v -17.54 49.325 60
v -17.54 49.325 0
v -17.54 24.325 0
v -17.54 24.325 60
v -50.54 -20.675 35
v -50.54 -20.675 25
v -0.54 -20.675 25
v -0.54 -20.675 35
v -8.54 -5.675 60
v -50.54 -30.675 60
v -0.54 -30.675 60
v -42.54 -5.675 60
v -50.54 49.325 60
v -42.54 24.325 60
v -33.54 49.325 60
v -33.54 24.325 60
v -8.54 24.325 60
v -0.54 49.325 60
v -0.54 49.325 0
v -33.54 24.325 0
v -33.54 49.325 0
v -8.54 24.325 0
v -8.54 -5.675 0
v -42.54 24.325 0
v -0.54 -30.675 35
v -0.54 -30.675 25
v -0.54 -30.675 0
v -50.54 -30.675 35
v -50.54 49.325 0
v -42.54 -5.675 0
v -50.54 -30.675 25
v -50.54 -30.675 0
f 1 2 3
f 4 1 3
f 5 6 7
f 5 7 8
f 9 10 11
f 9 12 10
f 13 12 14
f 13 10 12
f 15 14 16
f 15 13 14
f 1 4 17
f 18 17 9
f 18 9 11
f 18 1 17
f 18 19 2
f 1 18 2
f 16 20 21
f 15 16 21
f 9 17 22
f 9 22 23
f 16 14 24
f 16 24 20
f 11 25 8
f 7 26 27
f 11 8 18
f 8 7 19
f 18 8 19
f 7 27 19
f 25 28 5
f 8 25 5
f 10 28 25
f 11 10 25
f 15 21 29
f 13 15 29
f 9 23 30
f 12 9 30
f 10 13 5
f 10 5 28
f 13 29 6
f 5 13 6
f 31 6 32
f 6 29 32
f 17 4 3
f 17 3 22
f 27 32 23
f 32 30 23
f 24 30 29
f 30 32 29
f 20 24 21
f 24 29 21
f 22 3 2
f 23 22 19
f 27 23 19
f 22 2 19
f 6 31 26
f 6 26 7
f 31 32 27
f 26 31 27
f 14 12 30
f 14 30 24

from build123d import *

# Parameters (mm, degrees)
BOSS_EXTRUDE2_DEPTH = 60
SKETCH2_W           = 10
SKETCH2_H           = 10
CUT_EXTRUDE1_DEPTH  = 60


with BuildPart() as part:
    # Sketch1 → Boss-Extrude2 (new body)
    with BuildSketch(Plane.XY):
        Polygon((-50.540381022, -30.675149326), (-0.540381022, -30.675149326), (-0.540381022, 49.324850674), (-17.540381022, 49.324850674), (-17.540381022, 24.324850674), (-8.540381022, 24.324850674), (-8.540381022, -5.675149326), (-42.540381022, -5.675149326), (-42.540381022, 24.324850674), (-33.540381022, 24.324850674), (-33.540381022, 49.324850674), (-50.540381022, 49.324850674), align=None)
    extrude(amount=BOSS_EXTRUDE2_DEPTH)

    # Sketch2 → Cut-Extrude1 (cut)
    with BuildSketch(Plane.ZY.offset(50.540381022)):
        with Locations((30, -25.675149326)):
            Rectangle(SKETCH2_W, SKETCH2_H)
    extrude(amount=-CUT_EXTRUDE1_DEPTH, mode=Mode.SUBTRACT)


solid = part.part
